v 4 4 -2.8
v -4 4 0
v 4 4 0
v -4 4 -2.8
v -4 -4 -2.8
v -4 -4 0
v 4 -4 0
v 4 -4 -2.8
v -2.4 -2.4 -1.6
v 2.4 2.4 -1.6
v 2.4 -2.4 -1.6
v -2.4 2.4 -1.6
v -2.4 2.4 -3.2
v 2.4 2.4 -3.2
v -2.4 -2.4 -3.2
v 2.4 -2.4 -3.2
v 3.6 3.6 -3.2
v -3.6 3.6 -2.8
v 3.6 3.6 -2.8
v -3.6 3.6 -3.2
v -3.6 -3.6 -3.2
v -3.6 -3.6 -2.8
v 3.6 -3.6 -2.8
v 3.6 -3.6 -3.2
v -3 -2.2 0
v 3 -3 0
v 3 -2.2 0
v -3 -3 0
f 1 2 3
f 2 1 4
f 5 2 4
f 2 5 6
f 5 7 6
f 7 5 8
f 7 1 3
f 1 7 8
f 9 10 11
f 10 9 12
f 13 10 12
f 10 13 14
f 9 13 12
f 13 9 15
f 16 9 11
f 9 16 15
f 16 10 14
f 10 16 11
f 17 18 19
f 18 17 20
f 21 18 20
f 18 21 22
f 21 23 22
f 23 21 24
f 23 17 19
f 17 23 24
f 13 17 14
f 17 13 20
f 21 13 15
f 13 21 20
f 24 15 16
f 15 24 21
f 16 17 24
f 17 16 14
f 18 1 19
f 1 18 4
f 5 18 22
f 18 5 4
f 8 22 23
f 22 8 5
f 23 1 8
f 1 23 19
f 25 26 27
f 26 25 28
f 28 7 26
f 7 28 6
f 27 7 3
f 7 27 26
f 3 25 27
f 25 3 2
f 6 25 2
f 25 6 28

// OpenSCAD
// file: ../p/box5.scad
use <../lib.scad>
function ldraw_lib__box5() = [
// 0 Box with 5 Faces and All Edges
// 0 Name: box5.dat
// 0 Author: James Jessiman
// 0 !LDRAW_ORG Primitive UPDATE 2012-01
// 0 !LICENSE Licensed under CC BY 4.0 : see CAreadme.txt
// 
// 0 BFC CERTIFY CCW
  [0,"BFC","CERTIFY"],
  [0,"BFC","CCW"],
// 
// 0 !HISTORY 2002-04-03 [sbliss] Modified for BFC compliance
// 0 !HISTORY 2002-04-25 [PTadmin] Official Update 2002-02
// 0 !HISTORY 2007-06-24 [PTadmin] Header formatted for Contributor Agreement
// 0 !HISTORY 2008-07-01 [PTadmin] Official Update 2008-01
// 0 !HISTORY 2012-02-16 [Philo] Changed to CCW
// 0 !HISTORY 2012-03-30 [PTadmin] Official Update 2012-01
// 
// 
// 2 24 1 1 1 -1 1 1
  [2,24,1,1,1,-1,1,1],
// 2 24 -1 1 1 -1 1 -1
  [2,24,-1,1,1,-1,1,-1],
// 2 24 -1 1 -1 1 1 -1
  [2,24,-1,1,-1,1,1,-1],
// 2 24 1 1 -1 1 1 1
  [2,24,1,1,-1,1,1,1],
// 2 24 1 0 1 -1 0 1
  [2,24,1,0,1,-1,0,1],
// 2 24 -1 0 1 -1 0 -1
  [2,24,-1,0,1,-1,0,-1],
// 2 24 -1 0 -1 1 0 -1
  [2,24,-1,0,-1,1,0,-1],
// 2 24 1 0 -1 1 0 1
  [2,24,1,0,-1,1,0,1],
// 2 24 1 0 1 1 1 1
  [2,24,1,0,1,1,1,1],
// 2 24 -1 0 1 -1 1 1
  [2,24,-1,0,1,-1,1,1],
// 2 24 1 0 -1 1 1 -1
  [2,24,1,0,-1,1,1,-1],
// 2 24 -1 0 -1 -1 1 -1
  [2,24,-1,0,-1,-1,1,-1],
// 4 16 -1 1 1 1 1 1 1 1 -1 -1 1 -1
  [4,16,-1,1,1,1,1,1,1,1,-1,-1,1,-1],
// 4 16 -1 1 1 -1 0 1 1 0 1 1 1 1
  [4,16,-1,1,1,-1,0,1,1,0,1,1,1,1],
// 4 16 -1 1 -1 -1 0 -1 -1 0 1 -1 1 1
  [4,16,-1,1,-1,-1,0,-1,-1,0,1,-1,1,1],
// 4 16 1 1 -1 1 0 -1 -1 0 -1 -1 1 -1
  [4,16,1,1,-1,1,0,-1,-1,0,-1,-1,1,-1],
// 4 16 1 1 1 1 0 1 1 0 -1 1 1 -1
  [4,16,1,1,1,1,0,1,1,0,-1,1,1,-1],
];
module ldraw_lib__box5(step=0, col=false, unit=2/5, alt=false, line=0.2, solid=!$preview)
    makepoly(ldraw_lib__box5(), step=step, col=col, unit=unit, alt=alt, line=line, solid=solid);
ldraw_lib__box5(line=0.2);
// file: ../p/box4.scad
use <../lib.scad>
function ldraw_lib__box4() = [
// 0 Box with 4 Faces (2 Parallel Pairs) and All Edges
// 0 Name: box4.dat
// 0 Author: James Jessiman
// 0 !LDRAW_ORG Primitive UPDATE 2012-01
// 0 !LICENSE Licensed under CC BY 4.0 : see CAreadme.txt
// 
// 0 BFC CERTIFY CCW
  [0,"BFC","CERTIFY"],
  [0,"BFC","CCW"],
// 
// 0 !HISTORY 2002-04-03 [sbliss] Modified for BFC compliance
// 0 !HISTORY 2002-04-25 [PTadmin] Official Update 2002-02
// 0 !HISTORY 2007-06-24 [PTadmin] Header formatted for Contributor Agreement
// 0 !HISTORY 2008-07-01 [PTadmin] Official Update 2008-01
// 0 !HISTORY 2012-02-16 [Philo] Changed to CCW
// 0 !HISTORY 2012-03-30 [PTadmin] Official Update 2012-01
// 
// 
// 2 24 1 1 1 -1 1 1
  [2,24,1,1,1,-1,1,1],
// 2 24 -1 1 1 -1 1 -1
  [2,24,-1,1,1,-1,1,-1],
// 2 24 -1 1 -1 1 1 -1
  [2,24,-1,1,-1,1,1,-1],
// 2 24 1 1 -1 1 1 1
  [2,24,1,1,-1,1,1,1],
// 2 24 1 0 1 -1 0 1
  [2,24,1,0,1,-1,0,1],
// 2 24 -1 0 1 -1 0 -1
  [2,24,-1,0,1,-1,0,-1],
// 2 24 -1 0 -1 1 0 -1
  [2,24,-1,0,-1,1,0,-1],
// 2 24 1 0 -1 1 0 1
  [2,24,1,0,-1,1,0,1],
// 2 24 1 0 1 1 1 1
  [2,24,1,0,1,1,1,1],
// 2 24 -1 0 1 -1 1 1
  [2,24,-1,0,1,-1,1,1],
// 2 24 1 0 -1 1 1 -1
  [2,24,1,0,-1,1,1,-1],
// 2 24 -1 0 -1 -1 1 -1
  [2,24,-1,0,-1,-1,1,-1],
// 4 16 -1 1 1 -1 0 1 1 0 1 1 1 1
  [4,16,-1,1,1,-1,0,1,1,0,1,1,1,1],
// 4 16 -1 1 -1 -1 0 -1 -1 0 1 -1 1 1
  [4,16,-1,1,-1,-1,0,-1,-1,0,1,-1,1,1],
// 4 16 1 1 -1 1 0 -1 -1 0 -1 -1 1 -1
  [4,16,1,1,-1,1,0,-1,-1,0,-1,-1,1,-1],
// 4 16 1 1 1 1 0 1 1 0 -1 1 1 -1
  [4,16,1,1,1,1,0,1,1,0,-1,1,1,-1],
];
module ldraw_lib__box4(step=0, col=false, unit=2/5, alt=false, line=0.2, solid=!$preview)
    makepoly(ldraw_lib__box4(), step=step, col=col, unit=unit, alt=alt, line=line, solid=solid);
ldraw_lib__box4(line=0.2);
// file: s/3070bs01.scad
use <../../lib.scad>
use <../../p/box4.scad>
use <../../p/box5.scad>
function ldraw_lib__s__3070bs01() = [
// 0 ~Tile  1 x  1 with Groove without Top Face
// 0 Name: s\3070bs01.dat
// 0 Author: Chris Dee [cwdee]
// 0 !LDRAW_ORG Subpart UPDATE 2009-02
// 0 !LICENSE Licensed under CC BY 4.0 : see CAreadme.txt
// 
// 0 BFC CERTIFY CCW
  [0,"BFC","CERTIFY"],
  [0,"BFC","CCW"],
// 
// 0 !HISTORY 2009-09-03 [PTadmin] Official Update 2009-02
// 
// 
// 1 16 0 0 0 10 0 0 0 7 0 0 0 10 box4.dat
  [1,16,0,0,0,10,0,0,0,7,0,0,0,10, ldraw_lib__box4()],
// 0 BFC INVERTNEXT
  [0,"BFC","INVERTNEXT"],
// 1 16 0 8 0 6 0 0 0 -4 0 0 0 6 box5.dat
  [1,16,0,8,0,6,0,0,0,-4,0,0,0,6, ldraw_lib__box5()],
// 1 16 0 7 0 9 0 0 0 1 0 0 0 9 box4.dat
  [1,16,0,7,0,9,0,0,0,1,0,0,0,9, ldraw_lib__box4()],
// 
// 4 16 9 8 9 6 8 6 -6 8 6 -9 8 9
  [4,16,9,8,9,6,8,6,-6,8,6,-9,8,9],
// 4 16 -9 8 9 -6 8 6 -6 8 -6 -9 8 -9
  [4,16,-9,8,9,-6,8,6,-6,8,-6,-9,8,-9],
// 4 16 -9 8 -9 -6 8 -6 6 8 -6 9 8 -9
  [4,16,-9,8,-9,-6,8,-6,6,8,-6,9,8,-9],
// 4 16 9 8 -9 6 8 -6 6 8 6 9 8 9
  [4,16,9,8,-9,6,8,-6,6,8,6,9,8,9],
// 
// 4 16 10 7 10 9 7 9 -9 7 9 -10 7 10
  [4,16,10,7,10,9,7,9,-9,7,9,-10,7,10],
// 4 16 -10 7 10 -9 7 9 -9 7 -9 -10 7 -10
  [4,16,-10,7,10,-9,7,9,-9,7,-9,-10,7,-10],
// 4 16 -10 7 -10 -9 7 -9 9 7 -9 10 7 -10
  [4,16,-10,7,-10,-9,7,-9,9,7,-9,10,7,-10],
// 4 16 10 7 -10 9 7 -9 9 7 9 10 7 10
  [4,16,10,7,-10,9,7,-9,9,7,9,10,7,10],
// 0
];
module ldraw_lib__s__3070bs01(step=0, col=false, unit=2/5, alt=false, line=0.2, solid=!$preview)
    makepoly(ldraw_lib__s__3070bs01(), step=step, col=col, unit=unit, alt=alt, line=line, solid=solid);
ldraw_lib__s__3070bs01(line=0.2);
// main file
use <../lib.scad>
use <s/3070bs01.scad>
function ldraw_lib__3070bpug() = [
// 0 Tile  1 x  1 with Silver "_" Pattern
// 0 Name: 3070bpug.dat
// 0 Author: Magnus Forsberg [MagFors]
// 0 !LDRAW_ORG Part UPDATE 2015-02
// 0 !LICENSE Licensed under CC BY 4.0 : see CAreadme.txt
// 
// 0 BFC CERTIFY CCW
  [0,"BFC","CERTIFY"],
  [0,"BFC","CCW"],
// 
// 0 !KEYWORDS underscore
// 
// 0 !HISTORY 2015-12-30 [PTadmin] Official Update 2015-02
// 
// 
// 1 16 0 0 0 1 0 0 0 1 0 0 0 1 s\3070bs01.dat
  [1,16,0,0,0,1,0,0,0,1,0,0,0,1, ldraw_lib__s__3070bs01()],
// 
// 4 80 7.5 0 -5.5 -7.5 0 -5.5 -7.5 0 -7.5 7.5 0 -7.5
  [4,80,7.5,0,-5.5,-7.5,0,-5.5,-7.5,0,-7.5,7.5,0,-7.5],
// 
// 4 16 -7.5 0 -7.5 -10 0 -10 10 0 -10 7.5 0 -7.5
  [4,16,-7.5,0,-7.5,-10,0,-10,10,0,-10,7.5,0,-7.5],
// 4 16 7.5 0 -5.5 7.5 0 -7.5 10 0 -10 10 0 10
  [4,16,7.5,0,-5.5,7.5,0,-7.5,10,0,-10,10,0,10],
// 4 16 -10 0 10 -7.5 0 -5.5 7.5 0 -5.5 10 0 10
  [4,16,-10,0,10,-7.5,0,-5.5,7.5,0,-5.5,10,0,10],
// 4 16 -10 0 -10 -7.5 0 -7.5 -7.5 0 -5.5 -10 0 10
  [4,16,-10,0,-10,-7.5,0,-7.5,-7.5,0,-5.5,-10,0,10],
];
module ldraw_lib__3070bpug(step=0, col=false, unit=2/5, alt=false, line=0.2, solid=!$preview)
    makepoly(ldraw_lib__3070bpug(), step=step, col=col, unit=unit, alt=alt, line=line, solid=solid);
ldraw_lib__3070bpug(line=0.2);
